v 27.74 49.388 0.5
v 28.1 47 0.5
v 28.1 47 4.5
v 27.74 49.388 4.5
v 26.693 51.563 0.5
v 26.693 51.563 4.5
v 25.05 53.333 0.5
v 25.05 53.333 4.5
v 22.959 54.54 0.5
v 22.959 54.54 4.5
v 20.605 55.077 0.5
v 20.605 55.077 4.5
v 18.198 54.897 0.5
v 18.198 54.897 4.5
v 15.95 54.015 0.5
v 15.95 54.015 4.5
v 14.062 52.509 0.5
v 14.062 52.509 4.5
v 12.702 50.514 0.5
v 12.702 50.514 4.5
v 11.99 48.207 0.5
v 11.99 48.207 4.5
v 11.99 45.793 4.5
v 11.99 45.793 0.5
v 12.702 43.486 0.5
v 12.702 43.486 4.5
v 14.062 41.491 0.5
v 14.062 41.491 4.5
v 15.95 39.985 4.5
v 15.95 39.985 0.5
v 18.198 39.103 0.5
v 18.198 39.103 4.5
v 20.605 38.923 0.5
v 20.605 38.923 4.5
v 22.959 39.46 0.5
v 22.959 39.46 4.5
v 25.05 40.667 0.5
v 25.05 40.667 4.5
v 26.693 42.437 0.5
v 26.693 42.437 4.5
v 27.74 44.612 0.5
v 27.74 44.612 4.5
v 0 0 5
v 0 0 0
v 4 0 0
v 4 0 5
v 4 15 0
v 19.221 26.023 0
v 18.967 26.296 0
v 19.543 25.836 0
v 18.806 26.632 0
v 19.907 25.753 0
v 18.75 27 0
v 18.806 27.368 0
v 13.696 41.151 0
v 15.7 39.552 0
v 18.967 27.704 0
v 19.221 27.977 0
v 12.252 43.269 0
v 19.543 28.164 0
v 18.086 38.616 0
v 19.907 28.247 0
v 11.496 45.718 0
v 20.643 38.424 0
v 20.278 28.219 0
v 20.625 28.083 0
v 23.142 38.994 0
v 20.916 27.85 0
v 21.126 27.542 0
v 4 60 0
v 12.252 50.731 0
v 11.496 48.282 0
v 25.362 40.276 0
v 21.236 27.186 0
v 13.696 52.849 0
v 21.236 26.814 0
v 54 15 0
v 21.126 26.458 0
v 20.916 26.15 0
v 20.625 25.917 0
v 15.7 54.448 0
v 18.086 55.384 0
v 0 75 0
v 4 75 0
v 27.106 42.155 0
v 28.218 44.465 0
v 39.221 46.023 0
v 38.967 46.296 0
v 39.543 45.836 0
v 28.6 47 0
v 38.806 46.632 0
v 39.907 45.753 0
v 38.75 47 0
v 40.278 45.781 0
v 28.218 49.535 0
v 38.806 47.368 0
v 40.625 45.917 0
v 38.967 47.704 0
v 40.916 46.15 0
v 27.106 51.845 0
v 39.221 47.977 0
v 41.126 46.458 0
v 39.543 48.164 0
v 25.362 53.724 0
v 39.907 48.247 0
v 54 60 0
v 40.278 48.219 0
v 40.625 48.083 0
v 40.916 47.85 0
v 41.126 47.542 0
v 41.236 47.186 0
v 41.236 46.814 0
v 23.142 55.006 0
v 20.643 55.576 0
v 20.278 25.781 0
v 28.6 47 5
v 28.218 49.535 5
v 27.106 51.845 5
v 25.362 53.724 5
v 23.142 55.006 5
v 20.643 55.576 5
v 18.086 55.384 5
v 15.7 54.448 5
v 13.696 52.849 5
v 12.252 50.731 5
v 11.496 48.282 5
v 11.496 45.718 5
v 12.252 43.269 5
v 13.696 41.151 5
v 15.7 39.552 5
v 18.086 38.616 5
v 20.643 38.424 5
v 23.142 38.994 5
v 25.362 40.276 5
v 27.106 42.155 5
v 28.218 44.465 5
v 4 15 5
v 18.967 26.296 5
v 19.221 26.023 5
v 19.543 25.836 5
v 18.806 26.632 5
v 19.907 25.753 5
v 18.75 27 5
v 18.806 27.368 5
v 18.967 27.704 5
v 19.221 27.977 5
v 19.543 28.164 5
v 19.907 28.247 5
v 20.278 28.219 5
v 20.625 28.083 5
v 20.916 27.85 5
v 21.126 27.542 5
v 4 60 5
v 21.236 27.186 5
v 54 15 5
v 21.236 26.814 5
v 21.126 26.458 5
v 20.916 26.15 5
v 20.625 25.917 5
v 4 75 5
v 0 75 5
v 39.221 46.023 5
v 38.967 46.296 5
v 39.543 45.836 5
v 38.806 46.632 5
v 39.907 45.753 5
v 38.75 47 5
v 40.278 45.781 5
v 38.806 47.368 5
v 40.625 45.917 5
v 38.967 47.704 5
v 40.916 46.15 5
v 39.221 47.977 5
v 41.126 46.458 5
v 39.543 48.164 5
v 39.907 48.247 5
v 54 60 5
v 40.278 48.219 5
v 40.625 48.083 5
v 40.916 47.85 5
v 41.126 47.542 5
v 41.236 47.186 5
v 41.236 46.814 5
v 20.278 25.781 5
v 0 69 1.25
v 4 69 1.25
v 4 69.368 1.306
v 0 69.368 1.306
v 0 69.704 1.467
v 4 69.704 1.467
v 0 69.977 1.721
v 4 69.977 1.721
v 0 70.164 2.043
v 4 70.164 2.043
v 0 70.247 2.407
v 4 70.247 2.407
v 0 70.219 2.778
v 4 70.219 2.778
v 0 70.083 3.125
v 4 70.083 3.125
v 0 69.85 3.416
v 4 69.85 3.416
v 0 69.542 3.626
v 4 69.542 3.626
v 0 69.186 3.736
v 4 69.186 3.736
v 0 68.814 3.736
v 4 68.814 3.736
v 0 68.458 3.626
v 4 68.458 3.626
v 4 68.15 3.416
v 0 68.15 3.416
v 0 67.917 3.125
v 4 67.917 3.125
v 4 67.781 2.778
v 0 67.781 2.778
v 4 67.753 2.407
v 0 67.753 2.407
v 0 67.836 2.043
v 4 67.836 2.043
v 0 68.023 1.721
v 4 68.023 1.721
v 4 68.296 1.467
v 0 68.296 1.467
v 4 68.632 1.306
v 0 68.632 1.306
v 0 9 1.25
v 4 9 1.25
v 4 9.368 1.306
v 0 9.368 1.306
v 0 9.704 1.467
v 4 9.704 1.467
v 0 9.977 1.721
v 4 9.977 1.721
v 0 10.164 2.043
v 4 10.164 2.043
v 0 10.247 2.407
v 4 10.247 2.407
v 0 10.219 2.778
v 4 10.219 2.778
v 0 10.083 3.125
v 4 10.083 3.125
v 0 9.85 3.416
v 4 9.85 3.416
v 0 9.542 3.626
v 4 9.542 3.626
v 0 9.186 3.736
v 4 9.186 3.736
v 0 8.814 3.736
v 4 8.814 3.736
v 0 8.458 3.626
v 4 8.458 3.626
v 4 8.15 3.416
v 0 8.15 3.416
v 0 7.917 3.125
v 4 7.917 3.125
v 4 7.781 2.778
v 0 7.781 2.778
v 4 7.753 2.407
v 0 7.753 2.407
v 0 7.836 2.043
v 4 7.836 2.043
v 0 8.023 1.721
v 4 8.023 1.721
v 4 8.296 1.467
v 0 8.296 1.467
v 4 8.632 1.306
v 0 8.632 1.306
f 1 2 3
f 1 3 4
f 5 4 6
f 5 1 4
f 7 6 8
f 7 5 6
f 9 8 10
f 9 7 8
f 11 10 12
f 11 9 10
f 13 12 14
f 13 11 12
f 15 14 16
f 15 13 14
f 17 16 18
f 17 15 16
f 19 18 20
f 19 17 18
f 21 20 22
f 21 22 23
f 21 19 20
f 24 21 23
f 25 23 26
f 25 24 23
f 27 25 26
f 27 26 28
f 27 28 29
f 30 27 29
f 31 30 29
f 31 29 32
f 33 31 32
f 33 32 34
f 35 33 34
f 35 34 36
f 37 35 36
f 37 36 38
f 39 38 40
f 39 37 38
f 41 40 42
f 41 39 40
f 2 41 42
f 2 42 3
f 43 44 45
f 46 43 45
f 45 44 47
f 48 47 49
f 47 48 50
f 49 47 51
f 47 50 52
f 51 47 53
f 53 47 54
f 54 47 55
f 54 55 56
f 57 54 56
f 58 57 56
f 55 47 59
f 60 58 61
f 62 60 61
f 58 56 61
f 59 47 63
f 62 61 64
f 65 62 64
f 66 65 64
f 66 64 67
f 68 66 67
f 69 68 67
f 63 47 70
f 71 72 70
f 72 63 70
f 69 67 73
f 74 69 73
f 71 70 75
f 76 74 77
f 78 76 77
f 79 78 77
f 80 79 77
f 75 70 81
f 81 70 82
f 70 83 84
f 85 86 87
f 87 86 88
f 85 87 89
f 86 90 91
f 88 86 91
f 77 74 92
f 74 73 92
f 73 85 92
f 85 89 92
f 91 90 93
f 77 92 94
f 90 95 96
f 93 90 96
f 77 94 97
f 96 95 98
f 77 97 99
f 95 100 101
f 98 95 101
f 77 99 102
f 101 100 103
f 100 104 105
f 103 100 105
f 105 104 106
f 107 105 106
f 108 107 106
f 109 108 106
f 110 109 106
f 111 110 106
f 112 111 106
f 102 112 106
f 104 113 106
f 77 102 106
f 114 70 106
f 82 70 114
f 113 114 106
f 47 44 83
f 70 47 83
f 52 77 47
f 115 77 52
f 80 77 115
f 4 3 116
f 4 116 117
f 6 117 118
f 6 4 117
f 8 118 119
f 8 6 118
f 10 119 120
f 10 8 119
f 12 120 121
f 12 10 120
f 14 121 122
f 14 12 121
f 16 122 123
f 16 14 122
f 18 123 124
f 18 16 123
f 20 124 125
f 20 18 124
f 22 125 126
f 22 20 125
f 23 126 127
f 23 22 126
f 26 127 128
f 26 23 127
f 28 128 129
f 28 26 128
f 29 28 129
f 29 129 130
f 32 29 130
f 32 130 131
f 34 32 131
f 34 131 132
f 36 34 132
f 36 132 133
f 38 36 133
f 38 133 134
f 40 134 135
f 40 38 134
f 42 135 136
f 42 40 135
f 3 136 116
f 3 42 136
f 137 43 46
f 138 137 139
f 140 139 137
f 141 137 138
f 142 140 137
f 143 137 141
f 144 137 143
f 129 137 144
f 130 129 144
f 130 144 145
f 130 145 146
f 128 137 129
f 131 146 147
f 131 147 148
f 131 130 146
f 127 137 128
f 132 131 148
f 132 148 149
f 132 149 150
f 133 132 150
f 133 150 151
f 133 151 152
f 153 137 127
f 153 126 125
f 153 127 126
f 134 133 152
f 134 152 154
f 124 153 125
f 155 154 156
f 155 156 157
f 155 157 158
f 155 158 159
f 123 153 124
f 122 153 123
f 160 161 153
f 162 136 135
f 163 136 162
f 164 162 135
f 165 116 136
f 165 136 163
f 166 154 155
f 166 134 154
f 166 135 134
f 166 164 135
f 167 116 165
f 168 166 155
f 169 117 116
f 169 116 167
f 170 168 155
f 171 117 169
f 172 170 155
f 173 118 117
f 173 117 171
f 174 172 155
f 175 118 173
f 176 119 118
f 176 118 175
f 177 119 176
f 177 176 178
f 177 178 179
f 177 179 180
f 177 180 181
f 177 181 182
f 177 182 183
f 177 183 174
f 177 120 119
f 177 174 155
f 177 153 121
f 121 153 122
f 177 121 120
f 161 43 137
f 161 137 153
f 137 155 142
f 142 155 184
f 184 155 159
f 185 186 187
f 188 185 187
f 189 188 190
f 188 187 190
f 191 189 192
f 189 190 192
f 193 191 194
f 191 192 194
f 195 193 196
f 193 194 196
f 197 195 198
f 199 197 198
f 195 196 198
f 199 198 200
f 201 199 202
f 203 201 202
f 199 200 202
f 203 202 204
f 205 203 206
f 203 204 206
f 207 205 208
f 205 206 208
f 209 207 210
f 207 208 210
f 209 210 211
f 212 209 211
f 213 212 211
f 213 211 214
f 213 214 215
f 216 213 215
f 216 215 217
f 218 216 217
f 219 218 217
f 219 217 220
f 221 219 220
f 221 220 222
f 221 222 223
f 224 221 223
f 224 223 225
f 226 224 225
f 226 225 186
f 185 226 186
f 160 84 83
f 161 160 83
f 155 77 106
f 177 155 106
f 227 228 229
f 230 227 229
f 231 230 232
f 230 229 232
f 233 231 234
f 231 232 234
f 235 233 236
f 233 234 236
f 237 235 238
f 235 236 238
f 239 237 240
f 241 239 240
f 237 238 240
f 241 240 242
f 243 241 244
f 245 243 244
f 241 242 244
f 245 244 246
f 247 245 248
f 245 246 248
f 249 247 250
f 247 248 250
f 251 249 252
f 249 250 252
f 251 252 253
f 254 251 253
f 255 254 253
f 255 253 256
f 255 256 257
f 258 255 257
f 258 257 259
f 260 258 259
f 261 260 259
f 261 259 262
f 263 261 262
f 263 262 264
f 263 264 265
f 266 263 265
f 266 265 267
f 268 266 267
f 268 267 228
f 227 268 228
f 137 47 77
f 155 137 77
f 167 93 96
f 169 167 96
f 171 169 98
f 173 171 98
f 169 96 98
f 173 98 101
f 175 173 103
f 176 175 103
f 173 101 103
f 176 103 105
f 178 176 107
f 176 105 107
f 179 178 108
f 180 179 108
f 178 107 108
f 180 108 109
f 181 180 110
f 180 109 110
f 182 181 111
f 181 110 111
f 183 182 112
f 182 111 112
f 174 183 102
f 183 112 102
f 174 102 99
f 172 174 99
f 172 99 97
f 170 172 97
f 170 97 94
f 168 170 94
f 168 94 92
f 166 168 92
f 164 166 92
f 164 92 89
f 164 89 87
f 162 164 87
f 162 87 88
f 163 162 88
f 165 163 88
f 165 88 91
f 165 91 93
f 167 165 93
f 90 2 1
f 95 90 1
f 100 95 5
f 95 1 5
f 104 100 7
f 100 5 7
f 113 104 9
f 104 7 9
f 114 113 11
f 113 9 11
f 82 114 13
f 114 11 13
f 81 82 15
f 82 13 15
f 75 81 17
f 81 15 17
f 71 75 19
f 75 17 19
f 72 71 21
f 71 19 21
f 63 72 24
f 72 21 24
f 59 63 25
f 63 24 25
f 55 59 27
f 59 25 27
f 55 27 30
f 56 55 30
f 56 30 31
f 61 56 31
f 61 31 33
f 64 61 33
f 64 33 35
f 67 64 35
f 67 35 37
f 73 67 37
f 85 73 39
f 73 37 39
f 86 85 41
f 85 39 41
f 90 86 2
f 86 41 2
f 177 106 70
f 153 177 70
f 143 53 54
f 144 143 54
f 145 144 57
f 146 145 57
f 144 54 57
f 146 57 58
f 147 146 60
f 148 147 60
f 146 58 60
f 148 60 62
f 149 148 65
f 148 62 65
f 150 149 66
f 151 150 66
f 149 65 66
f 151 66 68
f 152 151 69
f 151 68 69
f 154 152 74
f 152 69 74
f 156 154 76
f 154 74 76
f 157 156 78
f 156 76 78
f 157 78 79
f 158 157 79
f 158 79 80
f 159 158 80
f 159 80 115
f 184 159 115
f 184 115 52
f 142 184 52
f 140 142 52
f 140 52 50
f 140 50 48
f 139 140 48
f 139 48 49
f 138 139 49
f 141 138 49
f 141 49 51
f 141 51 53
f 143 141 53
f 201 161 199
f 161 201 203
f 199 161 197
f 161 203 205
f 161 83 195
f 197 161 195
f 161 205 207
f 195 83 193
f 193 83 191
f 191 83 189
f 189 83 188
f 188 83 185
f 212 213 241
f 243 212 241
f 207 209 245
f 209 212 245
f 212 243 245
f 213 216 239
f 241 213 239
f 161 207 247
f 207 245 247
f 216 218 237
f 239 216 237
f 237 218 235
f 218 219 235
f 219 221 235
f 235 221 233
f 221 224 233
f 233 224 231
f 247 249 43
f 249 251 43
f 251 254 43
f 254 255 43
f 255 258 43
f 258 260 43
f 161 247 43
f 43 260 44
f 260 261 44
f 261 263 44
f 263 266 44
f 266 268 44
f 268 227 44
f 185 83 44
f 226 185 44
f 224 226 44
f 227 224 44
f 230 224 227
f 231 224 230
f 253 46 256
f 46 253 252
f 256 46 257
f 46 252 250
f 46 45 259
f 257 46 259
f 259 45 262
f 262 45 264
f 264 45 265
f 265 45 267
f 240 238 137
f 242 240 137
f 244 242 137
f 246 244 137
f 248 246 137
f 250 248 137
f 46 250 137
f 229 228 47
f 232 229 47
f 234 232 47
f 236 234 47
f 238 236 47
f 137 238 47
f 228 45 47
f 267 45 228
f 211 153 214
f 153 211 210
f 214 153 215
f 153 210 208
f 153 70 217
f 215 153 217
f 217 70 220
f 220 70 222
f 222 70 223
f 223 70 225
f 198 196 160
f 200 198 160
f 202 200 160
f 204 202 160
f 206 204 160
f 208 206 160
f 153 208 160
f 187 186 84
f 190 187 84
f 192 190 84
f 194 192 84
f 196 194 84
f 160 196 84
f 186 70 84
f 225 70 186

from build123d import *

# Parameters (mm, degrees)
SKETCH_1_R          = 8.1
EXTRUDE_1_DEPTH     = 5
SKETCH_2_R          = 1.25
CUT_EXTRUDE_1_DEPTH = 5
SKETCH_3_R          = 1.25
CUT_EXTRUDE_2_DEPTH = 120
CHAMFER_1_SIZE      = 0.5
SKETCH_4_W          = 16
SKETCH_4_H          = 45
CUT_EXTRUDE_3_DEPTH = 10


with BuildPart() as part:
    # 草图1 → 凸台-拉伸1 (new body)
    with BuildSketch(Plane.XY):
        Polygon((4, 60), (4, 75), (0, 75), (0, 0), (4, 0), (4, 15), (70, 15), (70, 60), align=None)
        with Locations((20, 47)):
            Circle(SKETCH_1_R, mode=Mode.SUBTRACT)
    extrude(amount=EXTRUDE_1_DEPTH)

    # 草图2 → 切除-拉伸1 (cut)
    with BuildSketch(Plane(origin=(4, 0, 0), x_dir=(0, 0, -1), z_dir=(1, 0, 0))):
        with Locations((-2.5, 69)):
            Circle(SKETCH_2_R)
        with Locations((-2.5, 9)):
            Circle(SKETCH_2_R)
    extrude(amount=-CUT_EXTRUDE_1_DEPTH, mode=Mode.SUBTRACT)

    # 草图3 → 切除-拉伸2 (cut)
    with BuildSketch(Plane(origin=(0, 0, 0), x_dir=(-1, 0, 0), z_dir=(0, 0, -1))):
        with Locations((-40, 47)):
            Circle(SKETCH_3_R)
        with Locations((-20, 27)):
            Circle(SKETCH_3_R)
    extrude(amount=-CUT_EXTRUDE_2_DEPTH, mode=Mode.SUBTRACT)

    # 倒角1
    chamfer_1_edges = [part.edges().sort_by_distance(p)[0] for p in [
        (11.9, 47, 0),
        (11.9, 47, 5),
    ]]
    chamfer(chamfer_1_edges, length=CHAMFER_1_SIZE)

    # 草图4 → 切除-拉伸3 (cut)
    with BuildSketch(Plane(origin=(0, 0, 0), x_dir=(-1, 0, 0), z_dir=(0, 0, -1))):
        with Locations((-62, 37.5)):
            Rectangle(SKETCH_4_W, SKETCH_4_H)
    extrude(amount=-CUT_EXTRUDE_3_DEPTH, mode=Mode.SUBTRACT)


solid = part.part
